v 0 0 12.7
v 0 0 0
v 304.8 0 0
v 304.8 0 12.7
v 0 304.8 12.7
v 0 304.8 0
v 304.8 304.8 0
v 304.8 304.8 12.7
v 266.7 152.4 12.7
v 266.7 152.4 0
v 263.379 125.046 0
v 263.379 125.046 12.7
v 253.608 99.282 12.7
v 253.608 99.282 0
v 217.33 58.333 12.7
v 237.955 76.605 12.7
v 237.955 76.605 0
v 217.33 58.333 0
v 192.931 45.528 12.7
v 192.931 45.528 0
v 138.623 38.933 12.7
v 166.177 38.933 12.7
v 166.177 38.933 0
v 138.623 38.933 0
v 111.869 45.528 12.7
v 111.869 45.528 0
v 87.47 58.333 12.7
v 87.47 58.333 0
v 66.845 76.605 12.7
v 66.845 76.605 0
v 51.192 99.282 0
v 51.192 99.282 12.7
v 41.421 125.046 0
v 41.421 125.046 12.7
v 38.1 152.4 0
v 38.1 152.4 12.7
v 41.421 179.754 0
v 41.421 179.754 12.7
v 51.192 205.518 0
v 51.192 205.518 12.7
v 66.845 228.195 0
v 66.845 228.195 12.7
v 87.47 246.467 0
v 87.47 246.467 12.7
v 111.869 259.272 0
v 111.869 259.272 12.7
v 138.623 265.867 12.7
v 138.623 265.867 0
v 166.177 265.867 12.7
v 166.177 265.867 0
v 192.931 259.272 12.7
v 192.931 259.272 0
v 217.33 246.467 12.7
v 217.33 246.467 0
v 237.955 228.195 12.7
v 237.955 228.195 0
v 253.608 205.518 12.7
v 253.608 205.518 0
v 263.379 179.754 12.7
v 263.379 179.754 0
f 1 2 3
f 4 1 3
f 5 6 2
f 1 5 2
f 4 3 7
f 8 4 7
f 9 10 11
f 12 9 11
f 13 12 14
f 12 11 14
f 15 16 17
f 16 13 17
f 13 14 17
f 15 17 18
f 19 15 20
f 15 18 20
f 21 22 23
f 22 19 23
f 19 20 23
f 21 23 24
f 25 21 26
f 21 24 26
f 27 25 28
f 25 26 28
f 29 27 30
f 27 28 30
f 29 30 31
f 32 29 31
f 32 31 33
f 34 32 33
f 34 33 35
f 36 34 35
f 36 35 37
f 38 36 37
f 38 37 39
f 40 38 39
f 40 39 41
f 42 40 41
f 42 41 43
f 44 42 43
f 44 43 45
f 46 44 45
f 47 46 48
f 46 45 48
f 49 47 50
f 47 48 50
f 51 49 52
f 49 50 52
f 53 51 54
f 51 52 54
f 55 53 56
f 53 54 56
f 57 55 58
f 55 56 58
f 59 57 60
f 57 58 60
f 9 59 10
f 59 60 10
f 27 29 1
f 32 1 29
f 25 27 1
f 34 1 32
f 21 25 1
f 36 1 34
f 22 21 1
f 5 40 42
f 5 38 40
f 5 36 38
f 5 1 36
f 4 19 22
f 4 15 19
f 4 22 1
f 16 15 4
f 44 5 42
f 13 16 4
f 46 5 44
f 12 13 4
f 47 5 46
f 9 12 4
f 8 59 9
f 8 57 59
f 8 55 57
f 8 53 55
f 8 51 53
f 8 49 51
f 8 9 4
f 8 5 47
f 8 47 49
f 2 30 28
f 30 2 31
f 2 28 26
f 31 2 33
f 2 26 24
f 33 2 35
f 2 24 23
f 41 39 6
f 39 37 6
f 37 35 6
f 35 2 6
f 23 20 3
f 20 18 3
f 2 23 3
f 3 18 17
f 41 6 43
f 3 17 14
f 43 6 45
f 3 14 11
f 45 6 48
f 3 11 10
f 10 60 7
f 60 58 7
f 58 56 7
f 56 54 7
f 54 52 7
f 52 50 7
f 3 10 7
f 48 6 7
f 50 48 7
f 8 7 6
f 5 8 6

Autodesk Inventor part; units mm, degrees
ref_plane "YZ Plane" through (0, 0, 0) normal (1, 0, 0) x (0, 1, 0)
ref_plane "XZ Plane" through (0, 0, 0) normal (0, 1, 0) x (-1, 0, 0)
ref_plane "XY Plane" through (0, 0, 0) normal (0, 0, 1) x (1, 0, 0)
sketch "Sketch1" plane through (0, 0, 0) normal (0, 0, 1) x (1, 0, 0)
  line L0 (0, 0) -> (304.8, 0)
  line L1 (304.8, 0) -> (304.8, 304.8)
  line L2 (304.8, 304.8) -> (0, 304.8)
  line L3 (0, 304.8) -> (0, 0)
  circle A0 centre (152.4, 152.4) radius 114.3
  point P0 (304.8, 152.4)
  point P1 (152.4, 304.8)
  dimension "d0" = 304.8
  dimension "d1" = 228.6
extrude "Extrusion1" add sketch "Sketch1" along normal blind 12.7
properties material "MDF Medium Density Fiberboard"
